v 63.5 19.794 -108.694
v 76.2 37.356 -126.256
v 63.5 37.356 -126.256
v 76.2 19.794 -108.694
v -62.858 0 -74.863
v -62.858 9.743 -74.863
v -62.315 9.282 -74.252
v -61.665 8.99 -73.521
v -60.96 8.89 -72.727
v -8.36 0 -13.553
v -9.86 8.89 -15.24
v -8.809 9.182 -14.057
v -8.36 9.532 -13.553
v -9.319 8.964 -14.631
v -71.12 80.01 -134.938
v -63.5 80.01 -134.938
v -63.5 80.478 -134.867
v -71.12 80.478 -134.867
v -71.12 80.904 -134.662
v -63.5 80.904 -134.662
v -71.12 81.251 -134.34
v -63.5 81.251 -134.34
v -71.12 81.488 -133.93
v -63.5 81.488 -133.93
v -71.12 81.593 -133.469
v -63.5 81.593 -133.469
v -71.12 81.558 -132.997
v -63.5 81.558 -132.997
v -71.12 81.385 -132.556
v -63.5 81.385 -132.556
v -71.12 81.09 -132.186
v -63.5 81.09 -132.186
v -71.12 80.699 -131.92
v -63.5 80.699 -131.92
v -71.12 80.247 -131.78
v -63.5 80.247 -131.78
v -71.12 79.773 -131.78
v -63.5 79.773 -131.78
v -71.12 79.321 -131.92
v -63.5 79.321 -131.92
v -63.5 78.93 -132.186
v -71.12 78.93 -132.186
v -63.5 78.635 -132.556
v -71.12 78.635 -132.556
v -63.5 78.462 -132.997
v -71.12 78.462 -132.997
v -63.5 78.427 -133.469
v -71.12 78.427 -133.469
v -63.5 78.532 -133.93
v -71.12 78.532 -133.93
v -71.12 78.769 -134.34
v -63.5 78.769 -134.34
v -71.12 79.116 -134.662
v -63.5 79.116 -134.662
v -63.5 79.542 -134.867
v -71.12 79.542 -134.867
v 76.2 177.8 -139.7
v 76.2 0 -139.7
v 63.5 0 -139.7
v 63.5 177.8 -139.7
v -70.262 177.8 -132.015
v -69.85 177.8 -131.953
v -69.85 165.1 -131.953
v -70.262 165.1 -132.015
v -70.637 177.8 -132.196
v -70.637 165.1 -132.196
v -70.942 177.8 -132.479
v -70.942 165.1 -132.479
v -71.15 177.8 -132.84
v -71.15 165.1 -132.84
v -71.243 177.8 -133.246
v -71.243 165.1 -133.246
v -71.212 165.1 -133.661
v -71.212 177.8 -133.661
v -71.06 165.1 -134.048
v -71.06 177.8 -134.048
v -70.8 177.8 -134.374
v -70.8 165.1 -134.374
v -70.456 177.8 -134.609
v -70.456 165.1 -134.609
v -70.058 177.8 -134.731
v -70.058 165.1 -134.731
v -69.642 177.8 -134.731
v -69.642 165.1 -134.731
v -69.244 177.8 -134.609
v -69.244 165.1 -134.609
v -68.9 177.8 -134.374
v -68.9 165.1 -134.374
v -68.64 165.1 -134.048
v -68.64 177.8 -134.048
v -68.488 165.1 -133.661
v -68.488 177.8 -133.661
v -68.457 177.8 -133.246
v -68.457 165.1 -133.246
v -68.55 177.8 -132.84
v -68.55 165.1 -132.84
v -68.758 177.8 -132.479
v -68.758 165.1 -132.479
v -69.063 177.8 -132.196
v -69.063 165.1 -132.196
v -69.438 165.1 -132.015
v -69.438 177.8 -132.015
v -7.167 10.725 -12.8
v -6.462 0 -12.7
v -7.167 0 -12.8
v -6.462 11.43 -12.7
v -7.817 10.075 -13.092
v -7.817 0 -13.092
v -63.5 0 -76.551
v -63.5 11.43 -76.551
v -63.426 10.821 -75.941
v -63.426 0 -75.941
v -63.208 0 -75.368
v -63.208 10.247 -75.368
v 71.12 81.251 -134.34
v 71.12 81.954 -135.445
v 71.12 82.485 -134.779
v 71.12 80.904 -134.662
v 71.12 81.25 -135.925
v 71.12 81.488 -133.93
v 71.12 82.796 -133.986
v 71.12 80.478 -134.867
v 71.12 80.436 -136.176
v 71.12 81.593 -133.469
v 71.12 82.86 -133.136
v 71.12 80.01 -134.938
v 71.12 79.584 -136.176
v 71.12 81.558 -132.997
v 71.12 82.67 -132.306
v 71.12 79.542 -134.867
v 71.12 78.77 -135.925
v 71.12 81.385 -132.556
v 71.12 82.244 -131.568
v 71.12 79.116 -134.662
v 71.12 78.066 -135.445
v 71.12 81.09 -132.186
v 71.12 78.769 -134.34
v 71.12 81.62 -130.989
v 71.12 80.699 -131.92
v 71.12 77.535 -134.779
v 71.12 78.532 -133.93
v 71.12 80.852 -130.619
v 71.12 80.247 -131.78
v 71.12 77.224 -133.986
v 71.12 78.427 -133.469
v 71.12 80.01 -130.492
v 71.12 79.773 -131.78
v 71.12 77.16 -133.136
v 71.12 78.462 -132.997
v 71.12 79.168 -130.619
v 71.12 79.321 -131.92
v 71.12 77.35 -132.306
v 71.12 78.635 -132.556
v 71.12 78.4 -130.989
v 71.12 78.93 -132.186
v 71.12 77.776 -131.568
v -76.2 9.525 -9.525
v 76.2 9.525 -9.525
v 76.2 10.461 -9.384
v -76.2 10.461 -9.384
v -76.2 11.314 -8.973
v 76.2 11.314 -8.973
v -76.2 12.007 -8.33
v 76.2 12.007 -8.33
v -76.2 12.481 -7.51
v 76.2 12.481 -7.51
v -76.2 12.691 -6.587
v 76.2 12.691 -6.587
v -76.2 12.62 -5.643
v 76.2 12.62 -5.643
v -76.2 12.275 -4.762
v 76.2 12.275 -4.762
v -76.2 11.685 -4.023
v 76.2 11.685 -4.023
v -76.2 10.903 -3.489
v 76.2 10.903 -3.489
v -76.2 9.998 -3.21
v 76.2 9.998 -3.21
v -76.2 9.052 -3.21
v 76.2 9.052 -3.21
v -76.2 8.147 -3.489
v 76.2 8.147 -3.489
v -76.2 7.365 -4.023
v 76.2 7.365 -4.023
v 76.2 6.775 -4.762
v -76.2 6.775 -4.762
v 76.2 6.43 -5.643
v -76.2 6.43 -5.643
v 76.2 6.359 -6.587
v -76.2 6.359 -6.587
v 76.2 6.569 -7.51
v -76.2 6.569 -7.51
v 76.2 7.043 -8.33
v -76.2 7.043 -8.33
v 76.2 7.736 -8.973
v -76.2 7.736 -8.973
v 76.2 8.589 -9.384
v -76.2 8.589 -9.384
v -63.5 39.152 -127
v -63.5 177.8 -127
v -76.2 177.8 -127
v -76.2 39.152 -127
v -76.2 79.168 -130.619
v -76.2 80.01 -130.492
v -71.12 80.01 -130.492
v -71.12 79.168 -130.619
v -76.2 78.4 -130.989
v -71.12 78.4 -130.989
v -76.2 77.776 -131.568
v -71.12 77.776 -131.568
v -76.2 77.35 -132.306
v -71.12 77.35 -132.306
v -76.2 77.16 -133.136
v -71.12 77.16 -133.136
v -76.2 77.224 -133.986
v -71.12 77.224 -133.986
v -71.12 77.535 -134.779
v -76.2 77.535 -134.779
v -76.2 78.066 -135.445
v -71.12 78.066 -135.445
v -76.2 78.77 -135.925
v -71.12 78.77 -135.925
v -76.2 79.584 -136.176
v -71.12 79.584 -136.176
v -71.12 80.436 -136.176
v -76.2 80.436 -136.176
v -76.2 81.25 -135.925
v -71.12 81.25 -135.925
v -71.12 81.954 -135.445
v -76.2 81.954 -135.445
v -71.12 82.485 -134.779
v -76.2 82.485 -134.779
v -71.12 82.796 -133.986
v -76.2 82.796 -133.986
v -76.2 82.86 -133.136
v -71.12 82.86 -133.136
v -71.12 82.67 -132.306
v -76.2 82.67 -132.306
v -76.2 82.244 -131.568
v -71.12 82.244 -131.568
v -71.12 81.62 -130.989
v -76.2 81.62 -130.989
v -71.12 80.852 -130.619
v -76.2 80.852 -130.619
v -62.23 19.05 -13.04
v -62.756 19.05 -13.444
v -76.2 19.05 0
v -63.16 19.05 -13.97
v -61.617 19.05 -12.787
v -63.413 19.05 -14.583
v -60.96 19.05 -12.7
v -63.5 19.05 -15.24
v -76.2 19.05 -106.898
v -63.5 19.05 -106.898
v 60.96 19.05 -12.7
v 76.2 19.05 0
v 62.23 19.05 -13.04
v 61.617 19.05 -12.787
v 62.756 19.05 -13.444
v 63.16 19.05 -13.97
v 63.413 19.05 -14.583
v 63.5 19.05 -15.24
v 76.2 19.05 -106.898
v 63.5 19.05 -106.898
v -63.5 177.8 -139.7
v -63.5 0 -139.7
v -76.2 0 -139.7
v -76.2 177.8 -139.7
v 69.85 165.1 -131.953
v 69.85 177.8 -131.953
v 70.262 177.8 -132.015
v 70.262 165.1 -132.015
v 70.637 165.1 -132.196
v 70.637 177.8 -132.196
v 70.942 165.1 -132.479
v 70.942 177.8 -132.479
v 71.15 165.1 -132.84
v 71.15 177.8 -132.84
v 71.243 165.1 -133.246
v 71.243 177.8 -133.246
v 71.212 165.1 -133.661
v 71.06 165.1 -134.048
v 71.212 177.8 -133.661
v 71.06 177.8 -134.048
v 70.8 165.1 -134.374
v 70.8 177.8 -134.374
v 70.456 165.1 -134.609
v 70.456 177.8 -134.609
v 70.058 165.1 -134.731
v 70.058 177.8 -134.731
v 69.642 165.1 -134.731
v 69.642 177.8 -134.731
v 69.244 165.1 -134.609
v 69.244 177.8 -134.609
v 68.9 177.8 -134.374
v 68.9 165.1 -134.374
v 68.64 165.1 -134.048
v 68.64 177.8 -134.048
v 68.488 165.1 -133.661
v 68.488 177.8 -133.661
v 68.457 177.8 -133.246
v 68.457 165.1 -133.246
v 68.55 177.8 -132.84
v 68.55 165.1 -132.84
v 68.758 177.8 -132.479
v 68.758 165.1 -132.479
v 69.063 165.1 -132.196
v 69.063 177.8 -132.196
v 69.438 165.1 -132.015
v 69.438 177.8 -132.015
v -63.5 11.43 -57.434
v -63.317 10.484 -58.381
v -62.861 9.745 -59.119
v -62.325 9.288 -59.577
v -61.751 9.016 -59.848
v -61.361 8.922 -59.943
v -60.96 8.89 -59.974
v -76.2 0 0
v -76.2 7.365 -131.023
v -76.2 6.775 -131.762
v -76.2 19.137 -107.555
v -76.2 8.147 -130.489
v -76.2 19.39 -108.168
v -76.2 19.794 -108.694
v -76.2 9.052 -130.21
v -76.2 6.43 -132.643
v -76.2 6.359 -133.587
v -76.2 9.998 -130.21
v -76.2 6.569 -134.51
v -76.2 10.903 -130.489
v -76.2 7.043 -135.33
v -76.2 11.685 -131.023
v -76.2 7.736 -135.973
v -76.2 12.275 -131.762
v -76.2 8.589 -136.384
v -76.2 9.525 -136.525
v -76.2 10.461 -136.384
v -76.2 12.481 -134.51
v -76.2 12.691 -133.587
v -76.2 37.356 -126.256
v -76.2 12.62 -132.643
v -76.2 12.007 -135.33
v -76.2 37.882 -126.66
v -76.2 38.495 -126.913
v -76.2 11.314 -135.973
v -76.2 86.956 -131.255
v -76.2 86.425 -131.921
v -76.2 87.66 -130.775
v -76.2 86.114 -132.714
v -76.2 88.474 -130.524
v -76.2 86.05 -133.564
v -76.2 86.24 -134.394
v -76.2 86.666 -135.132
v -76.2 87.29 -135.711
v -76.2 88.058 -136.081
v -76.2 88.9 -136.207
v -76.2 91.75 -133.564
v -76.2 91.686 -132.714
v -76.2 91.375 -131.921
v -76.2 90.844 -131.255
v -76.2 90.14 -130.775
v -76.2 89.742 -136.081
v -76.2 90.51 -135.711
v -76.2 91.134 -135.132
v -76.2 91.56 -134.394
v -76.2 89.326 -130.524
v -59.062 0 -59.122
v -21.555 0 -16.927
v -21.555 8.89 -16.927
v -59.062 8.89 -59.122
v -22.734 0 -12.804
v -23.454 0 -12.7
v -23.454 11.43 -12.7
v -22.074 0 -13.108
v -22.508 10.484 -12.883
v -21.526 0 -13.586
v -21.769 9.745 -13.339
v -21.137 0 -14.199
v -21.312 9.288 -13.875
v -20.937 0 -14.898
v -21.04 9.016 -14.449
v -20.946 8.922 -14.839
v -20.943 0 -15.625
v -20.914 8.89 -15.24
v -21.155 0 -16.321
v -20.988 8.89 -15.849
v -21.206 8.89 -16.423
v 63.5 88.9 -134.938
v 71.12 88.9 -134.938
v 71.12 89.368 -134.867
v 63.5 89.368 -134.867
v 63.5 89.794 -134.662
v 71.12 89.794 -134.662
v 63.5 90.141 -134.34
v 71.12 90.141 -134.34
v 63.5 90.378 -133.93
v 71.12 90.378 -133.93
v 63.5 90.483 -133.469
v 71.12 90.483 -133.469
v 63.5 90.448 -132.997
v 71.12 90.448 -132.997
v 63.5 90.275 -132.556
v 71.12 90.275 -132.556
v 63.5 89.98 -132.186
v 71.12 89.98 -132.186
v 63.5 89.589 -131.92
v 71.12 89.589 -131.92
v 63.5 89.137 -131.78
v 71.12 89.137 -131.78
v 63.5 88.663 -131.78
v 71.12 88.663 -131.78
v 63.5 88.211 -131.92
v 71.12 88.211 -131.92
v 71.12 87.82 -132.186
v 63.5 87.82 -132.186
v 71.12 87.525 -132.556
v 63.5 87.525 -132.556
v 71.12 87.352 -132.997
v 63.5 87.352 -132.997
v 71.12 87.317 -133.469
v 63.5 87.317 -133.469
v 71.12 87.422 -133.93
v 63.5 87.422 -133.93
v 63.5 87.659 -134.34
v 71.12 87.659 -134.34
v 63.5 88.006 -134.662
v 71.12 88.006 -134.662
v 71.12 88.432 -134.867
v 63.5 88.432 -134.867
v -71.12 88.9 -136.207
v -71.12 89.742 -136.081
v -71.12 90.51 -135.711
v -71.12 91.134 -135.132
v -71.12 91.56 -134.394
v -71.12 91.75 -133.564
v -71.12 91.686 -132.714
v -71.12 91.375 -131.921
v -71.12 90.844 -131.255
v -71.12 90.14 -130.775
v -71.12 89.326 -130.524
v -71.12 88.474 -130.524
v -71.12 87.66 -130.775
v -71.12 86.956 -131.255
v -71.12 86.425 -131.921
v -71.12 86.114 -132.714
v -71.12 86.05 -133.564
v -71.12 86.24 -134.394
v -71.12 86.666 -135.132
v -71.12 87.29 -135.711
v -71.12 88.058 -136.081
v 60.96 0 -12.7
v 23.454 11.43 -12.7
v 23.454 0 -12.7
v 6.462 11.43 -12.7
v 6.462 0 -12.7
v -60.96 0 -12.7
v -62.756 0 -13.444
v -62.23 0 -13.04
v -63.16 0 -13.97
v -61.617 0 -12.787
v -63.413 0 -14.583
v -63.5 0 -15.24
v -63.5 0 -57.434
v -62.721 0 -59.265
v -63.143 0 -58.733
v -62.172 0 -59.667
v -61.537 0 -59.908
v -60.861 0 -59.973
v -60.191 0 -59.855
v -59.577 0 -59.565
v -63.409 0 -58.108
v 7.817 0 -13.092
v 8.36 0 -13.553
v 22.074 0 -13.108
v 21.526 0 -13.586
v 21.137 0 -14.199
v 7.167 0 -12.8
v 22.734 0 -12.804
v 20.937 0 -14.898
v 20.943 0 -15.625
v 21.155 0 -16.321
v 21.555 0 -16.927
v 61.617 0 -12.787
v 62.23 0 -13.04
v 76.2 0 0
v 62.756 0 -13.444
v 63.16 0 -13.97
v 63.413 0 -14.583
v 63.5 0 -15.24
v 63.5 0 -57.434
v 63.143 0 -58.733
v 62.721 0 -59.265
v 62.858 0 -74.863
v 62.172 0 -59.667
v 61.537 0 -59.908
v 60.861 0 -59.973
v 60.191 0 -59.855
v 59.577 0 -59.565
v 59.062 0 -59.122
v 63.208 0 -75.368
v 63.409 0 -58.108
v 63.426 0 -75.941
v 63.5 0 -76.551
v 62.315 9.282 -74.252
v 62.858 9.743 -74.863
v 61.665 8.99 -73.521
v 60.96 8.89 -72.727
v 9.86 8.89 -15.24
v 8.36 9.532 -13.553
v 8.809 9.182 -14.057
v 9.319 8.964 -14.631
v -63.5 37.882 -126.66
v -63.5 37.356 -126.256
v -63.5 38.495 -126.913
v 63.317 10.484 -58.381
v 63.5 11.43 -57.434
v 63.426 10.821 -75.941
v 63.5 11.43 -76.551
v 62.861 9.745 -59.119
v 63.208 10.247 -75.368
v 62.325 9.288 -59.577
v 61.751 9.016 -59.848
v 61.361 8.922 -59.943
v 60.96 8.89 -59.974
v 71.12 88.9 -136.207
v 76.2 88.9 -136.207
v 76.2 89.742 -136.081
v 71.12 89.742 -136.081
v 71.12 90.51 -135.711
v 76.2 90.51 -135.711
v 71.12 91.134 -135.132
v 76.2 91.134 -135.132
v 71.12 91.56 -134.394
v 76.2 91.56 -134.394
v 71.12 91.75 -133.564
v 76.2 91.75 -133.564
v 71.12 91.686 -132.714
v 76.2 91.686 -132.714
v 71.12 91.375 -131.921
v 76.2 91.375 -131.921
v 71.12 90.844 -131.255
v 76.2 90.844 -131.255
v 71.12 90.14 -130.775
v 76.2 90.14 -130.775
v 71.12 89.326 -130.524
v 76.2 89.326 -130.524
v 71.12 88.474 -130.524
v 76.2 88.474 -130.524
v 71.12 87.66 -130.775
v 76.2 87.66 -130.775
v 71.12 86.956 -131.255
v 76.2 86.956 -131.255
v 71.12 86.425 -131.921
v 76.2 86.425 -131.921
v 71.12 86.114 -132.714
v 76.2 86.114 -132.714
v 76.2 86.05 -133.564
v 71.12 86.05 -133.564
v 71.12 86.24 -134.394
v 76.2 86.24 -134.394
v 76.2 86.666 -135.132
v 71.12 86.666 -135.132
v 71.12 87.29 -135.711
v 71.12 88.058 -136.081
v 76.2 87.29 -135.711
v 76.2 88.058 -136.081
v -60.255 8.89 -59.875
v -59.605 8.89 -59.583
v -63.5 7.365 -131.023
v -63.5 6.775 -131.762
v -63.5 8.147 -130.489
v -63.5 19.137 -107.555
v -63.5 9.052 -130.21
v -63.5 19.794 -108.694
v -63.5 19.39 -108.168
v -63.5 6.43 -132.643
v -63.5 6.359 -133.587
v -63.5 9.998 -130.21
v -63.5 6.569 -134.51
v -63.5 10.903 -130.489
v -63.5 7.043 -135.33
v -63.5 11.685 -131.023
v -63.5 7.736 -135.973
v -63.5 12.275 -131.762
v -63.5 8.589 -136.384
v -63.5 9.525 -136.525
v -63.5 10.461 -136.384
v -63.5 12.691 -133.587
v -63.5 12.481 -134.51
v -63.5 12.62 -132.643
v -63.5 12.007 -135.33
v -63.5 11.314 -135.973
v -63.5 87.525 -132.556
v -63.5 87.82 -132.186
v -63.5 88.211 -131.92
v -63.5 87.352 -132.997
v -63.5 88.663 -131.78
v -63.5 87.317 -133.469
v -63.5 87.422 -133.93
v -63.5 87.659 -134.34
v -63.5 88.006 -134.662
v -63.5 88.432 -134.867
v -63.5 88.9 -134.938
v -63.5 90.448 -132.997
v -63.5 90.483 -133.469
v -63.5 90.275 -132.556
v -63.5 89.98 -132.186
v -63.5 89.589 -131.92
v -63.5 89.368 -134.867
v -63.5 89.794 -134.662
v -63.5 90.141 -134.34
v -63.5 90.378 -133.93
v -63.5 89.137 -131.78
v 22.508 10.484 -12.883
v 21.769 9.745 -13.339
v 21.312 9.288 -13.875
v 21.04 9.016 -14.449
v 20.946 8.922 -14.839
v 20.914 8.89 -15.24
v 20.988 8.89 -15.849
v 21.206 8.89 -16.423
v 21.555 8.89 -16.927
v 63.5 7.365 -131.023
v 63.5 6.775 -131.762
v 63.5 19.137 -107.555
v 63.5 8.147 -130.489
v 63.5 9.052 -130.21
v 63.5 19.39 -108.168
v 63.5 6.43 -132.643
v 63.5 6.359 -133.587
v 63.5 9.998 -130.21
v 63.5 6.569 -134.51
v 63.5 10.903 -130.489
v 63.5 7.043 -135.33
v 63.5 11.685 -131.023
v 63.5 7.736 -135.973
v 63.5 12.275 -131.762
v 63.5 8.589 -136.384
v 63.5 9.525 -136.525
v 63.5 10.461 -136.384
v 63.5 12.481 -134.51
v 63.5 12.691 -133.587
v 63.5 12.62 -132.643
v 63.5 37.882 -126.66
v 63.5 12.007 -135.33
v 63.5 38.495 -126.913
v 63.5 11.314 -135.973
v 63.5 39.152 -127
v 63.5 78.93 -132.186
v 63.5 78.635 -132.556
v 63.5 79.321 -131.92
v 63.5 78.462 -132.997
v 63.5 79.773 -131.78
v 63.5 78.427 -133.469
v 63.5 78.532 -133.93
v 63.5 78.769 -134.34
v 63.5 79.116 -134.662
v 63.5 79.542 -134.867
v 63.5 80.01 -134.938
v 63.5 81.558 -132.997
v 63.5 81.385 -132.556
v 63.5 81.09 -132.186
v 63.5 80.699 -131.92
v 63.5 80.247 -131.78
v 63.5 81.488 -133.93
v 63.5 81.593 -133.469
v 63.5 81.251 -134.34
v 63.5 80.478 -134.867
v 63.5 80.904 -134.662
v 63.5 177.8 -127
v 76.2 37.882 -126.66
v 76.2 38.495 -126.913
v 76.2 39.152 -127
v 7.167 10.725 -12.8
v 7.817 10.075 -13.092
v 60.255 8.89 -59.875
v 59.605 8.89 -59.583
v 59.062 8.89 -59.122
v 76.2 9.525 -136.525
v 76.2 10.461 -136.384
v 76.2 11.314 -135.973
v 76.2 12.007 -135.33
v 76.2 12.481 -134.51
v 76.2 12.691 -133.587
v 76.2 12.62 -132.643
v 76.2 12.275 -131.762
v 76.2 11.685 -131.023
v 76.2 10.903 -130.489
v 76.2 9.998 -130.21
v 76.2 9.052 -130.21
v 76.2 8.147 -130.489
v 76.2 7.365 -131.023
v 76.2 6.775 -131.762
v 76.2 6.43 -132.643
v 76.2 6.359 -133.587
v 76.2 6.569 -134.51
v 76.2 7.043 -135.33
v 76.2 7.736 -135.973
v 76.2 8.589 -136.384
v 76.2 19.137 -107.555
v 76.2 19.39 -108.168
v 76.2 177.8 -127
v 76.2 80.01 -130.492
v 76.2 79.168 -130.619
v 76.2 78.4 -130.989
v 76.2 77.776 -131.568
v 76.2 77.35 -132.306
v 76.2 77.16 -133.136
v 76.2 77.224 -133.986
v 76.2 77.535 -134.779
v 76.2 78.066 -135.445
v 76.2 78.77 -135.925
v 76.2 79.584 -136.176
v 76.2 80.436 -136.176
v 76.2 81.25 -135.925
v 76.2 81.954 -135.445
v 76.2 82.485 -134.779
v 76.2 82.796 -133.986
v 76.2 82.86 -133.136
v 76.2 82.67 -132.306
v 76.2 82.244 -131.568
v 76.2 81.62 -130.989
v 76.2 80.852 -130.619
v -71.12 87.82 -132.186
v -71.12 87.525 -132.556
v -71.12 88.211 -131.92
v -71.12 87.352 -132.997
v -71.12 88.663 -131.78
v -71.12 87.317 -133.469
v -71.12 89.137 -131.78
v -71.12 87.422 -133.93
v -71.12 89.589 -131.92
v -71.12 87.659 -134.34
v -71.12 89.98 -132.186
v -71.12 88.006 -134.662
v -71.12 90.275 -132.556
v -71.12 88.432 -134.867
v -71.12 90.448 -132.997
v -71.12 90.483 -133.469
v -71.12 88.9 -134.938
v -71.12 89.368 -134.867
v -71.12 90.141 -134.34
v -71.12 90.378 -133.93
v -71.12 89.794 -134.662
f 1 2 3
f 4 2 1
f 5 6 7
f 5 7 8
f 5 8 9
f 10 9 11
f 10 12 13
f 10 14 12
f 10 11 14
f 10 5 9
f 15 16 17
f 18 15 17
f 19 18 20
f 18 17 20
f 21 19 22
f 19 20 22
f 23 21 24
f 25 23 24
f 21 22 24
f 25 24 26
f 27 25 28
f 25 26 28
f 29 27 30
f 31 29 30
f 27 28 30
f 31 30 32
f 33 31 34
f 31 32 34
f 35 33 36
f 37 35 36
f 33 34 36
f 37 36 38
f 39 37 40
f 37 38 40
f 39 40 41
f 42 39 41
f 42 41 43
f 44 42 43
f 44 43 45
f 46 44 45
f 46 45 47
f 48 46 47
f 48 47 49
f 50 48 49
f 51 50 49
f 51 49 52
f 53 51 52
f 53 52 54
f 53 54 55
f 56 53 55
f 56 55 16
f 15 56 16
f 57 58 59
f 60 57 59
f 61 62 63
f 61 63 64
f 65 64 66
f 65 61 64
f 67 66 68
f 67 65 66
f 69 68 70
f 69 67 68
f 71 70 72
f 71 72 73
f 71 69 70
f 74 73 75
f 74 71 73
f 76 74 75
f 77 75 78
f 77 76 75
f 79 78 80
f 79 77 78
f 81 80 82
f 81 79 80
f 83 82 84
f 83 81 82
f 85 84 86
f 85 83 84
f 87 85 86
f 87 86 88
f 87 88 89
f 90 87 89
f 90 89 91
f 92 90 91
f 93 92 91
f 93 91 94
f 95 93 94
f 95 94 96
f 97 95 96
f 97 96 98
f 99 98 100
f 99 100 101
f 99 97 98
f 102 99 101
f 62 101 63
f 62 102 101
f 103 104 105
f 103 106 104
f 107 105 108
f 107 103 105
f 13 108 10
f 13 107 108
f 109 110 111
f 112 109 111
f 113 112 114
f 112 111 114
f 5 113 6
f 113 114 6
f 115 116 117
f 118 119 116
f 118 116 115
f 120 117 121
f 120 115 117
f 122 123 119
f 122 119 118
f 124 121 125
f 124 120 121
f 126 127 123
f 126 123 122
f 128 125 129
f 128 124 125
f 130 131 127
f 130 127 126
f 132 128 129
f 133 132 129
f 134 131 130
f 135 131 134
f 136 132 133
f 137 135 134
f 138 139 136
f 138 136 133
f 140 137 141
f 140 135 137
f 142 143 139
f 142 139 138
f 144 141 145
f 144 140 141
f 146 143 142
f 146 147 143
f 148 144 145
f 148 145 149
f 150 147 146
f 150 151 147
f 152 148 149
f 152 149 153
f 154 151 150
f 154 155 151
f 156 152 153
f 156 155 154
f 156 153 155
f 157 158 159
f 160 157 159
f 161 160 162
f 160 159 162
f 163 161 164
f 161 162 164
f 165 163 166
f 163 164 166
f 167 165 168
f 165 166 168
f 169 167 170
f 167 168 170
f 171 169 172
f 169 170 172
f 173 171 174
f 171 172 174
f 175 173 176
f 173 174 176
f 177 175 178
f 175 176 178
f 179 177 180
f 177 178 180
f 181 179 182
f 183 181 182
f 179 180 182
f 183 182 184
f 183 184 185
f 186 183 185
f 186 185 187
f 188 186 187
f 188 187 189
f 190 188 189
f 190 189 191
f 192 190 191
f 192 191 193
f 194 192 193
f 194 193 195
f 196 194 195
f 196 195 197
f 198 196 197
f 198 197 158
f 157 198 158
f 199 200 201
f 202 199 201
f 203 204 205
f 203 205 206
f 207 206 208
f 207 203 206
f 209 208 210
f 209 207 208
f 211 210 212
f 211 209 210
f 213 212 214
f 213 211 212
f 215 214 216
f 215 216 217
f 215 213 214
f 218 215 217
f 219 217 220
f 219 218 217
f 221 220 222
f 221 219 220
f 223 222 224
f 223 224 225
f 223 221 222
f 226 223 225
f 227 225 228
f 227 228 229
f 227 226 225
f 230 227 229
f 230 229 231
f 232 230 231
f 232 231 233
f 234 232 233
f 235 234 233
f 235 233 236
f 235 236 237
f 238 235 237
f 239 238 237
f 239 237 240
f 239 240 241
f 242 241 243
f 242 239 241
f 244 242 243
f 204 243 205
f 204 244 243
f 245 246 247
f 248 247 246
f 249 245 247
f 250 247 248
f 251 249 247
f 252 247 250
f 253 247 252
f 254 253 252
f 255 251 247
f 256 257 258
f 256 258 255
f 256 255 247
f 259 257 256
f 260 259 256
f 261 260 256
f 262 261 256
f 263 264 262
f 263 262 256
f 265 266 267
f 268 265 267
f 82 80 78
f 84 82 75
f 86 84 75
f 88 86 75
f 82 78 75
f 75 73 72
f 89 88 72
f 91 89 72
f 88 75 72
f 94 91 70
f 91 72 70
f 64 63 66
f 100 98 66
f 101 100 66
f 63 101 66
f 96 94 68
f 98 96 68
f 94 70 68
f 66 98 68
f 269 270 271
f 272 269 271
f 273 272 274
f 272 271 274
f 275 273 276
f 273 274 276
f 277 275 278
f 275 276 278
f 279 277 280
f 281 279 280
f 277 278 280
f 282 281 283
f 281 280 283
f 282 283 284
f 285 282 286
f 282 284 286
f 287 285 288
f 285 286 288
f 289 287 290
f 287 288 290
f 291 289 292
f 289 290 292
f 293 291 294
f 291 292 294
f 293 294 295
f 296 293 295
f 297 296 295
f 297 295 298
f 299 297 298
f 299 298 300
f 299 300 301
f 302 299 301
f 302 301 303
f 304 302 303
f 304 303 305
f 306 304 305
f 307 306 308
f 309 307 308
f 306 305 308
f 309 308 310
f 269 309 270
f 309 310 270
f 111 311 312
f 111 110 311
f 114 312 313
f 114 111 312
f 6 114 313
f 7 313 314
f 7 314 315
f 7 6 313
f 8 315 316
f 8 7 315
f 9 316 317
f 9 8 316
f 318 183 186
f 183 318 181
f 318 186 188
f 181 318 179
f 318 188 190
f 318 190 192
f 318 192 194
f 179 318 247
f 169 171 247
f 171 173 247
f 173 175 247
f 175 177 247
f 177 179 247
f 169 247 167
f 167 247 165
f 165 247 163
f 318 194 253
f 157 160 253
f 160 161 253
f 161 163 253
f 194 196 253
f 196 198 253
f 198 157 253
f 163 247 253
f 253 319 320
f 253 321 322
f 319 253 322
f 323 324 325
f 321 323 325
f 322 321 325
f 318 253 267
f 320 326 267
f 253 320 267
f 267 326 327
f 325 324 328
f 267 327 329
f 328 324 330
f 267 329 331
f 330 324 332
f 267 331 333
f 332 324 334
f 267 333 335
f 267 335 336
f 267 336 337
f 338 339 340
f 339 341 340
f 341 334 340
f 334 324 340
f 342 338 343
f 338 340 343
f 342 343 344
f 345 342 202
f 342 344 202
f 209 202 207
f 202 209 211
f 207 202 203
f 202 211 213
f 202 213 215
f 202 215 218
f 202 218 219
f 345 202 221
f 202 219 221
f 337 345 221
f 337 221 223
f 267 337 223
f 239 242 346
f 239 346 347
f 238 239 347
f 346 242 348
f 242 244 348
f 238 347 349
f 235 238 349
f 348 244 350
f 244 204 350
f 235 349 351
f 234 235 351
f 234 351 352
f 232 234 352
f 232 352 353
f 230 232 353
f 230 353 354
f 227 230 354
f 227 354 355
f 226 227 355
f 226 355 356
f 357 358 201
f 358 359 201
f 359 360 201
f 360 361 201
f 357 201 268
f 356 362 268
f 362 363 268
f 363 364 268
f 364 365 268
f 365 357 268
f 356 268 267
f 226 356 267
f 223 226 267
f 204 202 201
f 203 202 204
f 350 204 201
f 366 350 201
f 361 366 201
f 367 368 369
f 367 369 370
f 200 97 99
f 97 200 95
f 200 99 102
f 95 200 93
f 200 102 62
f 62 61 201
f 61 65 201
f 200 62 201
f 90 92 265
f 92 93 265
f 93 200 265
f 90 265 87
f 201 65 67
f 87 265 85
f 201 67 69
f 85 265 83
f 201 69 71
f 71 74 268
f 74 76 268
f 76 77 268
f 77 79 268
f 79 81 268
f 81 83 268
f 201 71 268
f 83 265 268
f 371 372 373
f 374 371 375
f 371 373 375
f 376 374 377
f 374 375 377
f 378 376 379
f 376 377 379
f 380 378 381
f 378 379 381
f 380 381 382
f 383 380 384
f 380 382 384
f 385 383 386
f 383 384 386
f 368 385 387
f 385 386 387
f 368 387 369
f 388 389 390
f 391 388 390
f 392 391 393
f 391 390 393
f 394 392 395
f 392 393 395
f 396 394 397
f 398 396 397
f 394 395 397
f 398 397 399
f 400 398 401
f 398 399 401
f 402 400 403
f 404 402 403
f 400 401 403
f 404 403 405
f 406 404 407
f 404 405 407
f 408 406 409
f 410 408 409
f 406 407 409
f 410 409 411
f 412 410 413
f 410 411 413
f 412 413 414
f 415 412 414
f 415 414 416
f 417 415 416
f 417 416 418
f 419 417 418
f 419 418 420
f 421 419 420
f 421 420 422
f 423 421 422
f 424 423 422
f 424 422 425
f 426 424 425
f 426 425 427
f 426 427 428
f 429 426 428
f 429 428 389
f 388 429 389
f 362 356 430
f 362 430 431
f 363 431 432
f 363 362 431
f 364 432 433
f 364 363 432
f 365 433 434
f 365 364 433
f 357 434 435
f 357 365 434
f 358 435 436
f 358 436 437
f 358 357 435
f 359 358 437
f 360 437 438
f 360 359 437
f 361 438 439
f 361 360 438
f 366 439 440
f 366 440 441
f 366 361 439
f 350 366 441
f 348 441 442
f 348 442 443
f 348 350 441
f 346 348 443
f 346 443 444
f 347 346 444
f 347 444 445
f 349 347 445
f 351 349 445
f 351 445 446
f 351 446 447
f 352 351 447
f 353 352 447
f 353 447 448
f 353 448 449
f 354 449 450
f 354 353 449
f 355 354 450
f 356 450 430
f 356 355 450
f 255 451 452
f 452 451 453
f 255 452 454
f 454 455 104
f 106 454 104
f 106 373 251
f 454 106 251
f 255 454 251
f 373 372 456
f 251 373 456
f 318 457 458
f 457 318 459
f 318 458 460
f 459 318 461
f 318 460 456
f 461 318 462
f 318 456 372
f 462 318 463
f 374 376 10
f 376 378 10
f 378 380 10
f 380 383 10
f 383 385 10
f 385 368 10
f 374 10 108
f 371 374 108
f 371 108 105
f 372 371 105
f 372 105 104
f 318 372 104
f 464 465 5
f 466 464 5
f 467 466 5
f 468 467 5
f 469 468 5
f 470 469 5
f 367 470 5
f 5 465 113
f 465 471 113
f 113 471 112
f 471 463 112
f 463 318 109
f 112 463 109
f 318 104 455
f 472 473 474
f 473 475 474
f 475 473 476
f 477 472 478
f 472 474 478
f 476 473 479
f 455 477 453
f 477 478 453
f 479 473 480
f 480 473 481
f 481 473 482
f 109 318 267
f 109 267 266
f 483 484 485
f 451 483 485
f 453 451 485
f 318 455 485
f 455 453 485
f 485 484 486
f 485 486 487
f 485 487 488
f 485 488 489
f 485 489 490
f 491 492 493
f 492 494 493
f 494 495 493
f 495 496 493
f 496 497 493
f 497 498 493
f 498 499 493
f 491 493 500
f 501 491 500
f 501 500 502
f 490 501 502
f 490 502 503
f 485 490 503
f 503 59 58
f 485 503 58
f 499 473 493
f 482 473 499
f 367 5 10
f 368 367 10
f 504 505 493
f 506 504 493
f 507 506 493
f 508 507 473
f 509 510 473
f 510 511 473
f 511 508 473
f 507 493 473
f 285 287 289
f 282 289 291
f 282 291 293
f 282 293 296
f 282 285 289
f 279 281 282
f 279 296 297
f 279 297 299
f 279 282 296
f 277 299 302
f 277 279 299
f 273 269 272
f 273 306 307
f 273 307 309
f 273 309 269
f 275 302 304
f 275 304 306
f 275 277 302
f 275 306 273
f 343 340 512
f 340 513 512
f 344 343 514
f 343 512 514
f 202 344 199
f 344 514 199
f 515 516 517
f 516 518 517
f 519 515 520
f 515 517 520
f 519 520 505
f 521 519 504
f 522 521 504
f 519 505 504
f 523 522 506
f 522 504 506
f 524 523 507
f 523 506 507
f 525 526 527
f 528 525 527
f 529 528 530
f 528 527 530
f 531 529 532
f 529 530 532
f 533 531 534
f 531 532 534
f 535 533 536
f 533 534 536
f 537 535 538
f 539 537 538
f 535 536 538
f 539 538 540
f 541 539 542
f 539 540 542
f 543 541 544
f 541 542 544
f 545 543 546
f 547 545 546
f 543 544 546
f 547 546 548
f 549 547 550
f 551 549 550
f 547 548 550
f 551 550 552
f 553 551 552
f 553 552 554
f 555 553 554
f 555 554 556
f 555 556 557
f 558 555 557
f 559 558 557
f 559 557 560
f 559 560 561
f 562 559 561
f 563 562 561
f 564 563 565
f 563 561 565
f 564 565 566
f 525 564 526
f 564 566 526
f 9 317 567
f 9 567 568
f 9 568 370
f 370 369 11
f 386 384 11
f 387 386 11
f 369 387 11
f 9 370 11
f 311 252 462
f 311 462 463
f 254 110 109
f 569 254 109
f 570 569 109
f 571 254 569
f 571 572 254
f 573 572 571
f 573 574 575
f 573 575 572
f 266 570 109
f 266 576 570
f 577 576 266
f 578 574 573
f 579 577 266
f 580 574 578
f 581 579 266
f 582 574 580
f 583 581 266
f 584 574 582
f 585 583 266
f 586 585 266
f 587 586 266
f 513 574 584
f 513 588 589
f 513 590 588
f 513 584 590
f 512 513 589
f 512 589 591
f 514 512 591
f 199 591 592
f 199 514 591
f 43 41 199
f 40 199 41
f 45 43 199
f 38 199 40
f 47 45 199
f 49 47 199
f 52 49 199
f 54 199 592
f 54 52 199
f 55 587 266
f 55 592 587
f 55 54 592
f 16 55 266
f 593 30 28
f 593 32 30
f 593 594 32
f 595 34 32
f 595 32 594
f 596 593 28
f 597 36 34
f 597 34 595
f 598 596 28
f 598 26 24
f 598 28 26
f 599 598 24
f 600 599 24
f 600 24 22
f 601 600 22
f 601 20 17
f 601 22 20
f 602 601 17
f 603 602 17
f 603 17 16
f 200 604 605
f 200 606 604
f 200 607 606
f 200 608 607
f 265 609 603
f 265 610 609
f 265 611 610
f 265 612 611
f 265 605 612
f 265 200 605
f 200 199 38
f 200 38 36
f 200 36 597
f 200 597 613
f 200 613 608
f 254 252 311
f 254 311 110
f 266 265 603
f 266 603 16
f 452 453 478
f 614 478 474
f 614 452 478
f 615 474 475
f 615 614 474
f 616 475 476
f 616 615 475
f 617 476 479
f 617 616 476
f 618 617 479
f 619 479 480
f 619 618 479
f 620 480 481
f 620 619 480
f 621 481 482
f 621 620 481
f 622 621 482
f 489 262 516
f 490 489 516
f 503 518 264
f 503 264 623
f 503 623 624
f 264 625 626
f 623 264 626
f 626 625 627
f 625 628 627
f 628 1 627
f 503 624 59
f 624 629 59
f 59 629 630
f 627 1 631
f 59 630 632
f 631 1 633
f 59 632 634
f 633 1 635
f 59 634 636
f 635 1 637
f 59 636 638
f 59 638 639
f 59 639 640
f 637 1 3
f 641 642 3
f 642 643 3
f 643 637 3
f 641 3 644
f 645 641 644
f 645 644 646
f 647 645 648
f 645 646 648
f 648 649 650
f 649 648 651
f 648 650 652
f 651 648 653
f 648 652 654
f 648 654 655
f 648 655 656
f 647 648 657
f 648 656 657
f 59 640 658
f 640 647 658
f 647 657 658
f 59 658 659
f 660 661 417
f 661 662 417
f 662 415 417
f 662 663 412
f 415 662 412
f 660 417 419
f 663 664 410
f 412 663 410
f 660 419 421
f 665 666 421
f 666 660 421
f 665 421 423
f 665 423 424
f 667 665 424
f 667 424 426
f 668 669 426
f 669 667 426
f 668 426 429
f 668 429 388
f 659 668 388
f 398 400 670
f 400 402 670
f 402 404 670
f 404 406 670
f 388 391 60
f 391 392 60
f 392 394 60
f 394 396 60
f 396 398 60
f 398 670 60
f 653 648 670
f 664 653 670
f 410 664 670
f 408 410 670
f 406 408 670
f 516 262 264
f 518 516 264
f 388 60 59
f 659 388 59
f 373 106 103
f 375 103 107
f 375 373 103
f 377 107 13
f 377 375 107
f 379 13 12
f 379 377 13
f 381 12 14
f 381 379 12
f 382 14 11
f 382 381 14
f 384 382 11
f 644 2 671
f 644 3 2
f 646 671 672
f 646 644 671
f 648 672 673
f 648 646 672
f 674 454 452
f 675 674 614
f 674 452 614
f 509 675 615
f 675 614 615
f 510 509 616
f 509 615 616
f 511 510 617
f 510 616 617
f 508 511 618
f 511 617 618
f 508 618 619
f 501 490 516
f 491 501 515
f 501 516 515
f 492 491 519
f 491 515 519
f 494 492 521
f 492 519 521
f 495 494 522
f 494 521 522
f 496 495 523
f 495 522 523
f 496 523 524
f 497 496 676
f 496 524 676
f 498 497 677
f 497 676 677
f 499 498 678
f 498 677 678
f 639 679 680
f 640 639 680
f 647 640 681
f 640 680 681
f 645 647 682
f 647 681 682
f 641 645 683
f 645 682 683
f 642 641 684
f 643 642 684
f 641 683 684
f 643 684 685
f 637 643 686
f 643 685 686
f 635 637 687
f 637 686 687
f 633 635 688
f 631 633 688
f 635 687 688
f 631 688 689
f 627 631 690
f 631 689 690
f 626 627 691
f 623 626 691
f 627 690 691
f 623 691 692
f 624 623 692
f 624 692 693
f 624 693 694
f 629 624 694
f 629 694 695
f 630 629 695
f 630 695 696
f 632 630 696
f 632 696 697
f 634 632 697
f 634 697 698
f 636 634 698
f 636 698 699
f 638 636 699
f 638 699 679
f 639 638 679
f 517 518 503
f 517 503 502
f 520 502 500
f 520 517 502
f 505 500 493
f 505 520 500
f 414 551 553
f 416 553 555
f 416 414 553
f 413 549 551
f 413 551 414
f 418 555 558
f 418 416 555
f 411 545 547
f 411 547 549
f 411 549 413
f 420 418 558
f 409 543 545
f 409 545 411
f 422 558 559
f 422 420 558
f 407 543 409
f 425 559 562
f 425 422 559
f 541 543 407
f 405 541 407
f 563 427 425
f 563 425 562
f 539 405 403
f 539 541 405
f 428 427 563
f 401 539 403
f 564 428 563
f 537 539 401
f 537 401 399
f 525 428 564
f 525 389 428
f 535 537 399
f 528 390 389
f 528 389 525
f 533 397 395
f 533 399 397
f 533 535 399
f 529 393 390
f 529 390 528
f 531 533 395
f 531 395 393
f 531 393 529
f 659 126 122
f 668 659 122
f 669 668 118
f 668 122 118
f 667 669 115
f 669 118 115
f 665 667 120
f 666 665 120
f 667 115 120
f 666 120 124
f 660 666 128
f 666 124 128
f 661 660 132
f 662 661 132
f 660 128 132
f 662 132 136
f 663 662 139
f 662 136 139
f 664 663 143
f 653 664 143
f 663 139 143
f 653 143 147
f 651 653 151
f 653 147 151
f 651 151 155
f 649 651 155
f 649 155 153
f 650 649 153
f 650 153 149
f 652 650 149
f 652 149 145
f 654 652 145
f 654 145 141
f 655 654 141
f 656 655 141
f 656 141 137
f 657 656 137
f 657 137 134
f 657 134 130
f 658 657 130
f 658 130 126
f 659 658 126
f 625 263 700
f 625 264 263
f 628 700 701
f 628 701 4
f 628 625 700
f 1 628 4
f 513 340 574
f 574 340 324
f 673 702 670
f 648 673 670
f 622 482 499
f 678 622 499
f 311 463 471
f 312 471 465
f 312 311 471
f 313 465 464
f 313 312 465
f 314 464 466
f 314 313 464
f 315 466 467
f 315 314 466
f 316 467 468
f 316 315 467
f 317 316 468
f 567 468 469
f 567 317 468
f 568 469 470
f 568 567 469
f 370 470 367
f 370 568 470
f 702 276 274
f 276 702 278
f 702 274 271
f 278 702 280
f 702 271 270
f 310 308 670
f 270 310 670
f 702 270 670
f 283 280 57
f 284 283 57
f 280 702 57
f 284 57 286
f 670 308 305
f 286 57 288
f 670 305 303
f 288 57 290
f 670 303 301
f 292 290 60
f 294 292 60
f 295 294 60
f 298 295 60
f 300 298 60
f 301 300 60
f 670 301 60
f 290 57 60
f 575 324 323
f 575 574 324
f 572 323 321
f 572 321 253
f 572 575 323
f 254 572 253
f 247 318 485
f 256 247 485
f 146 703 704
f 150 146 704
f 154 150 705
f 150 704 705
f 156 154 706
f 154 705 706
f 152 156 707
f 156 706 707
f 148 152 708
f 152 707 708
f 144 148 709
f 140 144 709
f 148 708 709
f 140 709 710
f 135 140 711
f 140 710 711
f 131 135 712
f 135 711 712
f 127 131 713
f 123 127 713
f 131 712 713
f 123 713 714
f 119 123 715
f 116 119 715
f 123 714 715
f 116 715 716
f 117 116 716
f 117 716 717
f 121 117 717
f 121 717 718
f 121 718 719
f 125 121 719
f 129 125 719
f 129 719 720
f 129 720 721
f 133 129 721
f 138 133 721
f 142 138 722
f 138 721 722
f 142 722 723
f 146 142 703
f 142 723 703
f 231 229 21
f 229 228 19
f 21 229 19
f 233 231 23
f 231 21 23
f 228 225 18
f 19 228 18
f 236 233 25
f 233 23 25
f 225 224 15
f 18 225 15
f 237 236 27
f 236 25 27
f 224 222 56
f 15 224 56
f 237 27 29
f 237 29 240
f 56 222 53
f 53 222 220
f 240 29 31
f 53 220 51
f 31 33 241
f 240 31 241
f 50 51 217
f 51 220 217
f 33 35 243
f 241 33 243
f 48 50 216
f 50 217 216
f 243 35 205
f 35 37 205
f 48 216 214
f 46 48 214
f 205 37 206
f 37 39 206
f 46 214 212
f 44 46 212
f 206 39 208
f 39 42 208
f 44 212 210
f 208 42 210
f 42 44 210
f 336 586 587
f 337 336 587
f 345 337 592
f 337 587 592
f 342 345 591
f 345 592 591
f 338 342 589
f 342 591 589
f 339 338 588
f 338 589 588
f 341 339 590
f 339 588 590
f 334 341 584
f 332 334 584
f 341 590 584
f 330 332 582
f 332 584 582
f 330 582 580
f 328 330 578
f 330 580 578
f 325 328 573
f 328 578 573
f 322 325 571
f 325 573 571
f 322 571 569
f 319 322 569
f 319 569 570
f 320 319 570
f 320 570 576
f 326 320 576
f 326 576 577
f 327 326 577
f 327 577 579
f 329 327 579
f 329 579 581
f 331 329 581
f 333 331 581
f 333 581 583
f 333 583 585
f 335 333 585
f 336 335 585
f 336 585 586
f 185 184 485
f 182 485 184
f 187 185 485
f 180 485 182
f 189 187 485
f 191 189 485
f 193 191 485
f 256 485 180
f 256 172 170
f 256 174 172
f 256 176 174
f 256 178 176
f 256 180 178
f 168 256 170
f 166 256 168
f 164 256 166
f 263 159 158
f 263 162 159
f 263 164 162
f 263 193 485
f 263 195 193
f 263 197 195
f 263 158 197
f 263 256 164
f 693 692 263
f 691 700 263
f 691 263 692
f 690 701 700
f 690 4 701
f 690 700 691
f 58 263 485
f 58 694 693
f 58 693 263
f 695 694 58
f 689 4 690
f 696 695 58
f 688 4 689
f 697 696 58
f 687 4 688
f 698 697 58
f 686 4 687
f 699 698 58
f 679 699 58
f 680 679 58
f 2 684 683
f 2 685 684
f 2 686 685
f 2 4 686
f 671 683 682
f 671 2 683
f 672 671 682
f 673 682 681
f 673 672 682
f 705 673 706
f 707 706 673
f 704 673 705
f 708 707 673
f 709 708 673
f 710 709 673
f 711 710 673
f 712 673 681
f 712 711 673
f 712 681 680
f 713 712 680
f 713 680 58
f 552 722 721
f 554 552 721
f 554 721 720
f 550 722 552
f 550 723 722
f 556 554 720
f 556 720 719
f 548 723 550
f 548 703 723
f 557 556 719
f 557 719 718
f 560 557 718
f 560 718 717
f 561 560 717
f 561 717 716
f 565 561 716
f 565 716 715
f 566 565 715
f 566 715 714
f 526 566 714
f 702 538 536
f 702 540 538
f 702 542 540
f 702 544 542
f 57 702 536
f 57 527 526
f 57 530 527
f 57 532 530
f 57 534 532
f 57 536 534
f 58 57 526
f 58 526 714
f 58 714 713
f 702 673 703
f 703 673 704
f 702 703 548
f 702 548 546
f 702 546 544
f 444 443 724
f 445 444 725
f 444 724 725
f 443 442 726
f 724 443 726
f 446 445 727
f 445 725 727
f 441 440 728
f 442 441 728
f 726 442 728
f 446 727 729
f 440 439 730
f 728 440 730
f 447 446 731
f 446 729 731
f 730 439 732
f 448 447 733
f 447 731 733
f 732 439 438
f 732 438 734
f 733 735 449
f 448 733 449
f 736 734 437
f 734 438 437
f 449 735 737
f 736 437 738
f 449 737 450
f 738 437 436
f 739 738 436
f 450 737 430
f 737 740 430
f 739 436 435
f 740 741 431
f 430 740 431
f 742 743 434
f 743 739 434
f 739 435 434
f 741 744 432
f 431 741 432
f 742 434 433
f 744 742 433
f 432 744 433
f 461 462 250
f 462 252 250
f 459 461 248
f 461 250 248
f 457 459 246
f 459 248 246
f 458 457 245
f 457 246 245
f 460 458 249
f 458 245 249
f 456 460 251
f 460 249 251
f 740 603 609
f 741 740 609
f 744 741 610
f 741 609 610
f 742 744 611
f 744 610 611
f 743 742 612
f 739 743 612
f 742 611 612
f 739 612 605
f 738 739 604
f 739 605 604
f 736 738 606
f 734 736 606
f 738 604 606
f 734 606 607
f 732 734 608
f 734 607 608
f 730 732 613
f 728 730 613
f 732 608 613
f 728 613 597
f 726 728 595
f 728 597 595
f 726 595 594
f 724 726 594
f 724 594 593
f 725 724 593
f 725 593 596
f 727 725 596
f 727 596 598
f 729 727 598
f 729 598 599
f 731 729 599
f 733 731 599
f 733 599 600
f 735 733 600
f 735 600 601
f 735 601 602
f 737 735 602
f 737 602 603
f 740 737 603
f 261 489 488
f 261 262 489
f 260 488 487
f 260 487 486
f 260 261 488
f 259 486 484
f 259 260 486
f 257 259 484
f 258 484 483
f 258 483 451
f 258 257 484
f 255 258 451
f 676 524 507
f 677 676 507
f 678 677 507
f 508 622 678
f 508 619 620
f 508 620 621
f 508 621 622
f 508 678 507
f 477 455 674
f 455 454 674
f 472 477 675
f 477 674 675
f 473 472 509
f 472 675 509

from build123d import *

# Parameters (mm, degrees)
BOSS_EXTRUDE1_DEPTH   = 19.05
SKETCH2_W             = 12.7
SKETCH2_H             = 158.75
BOSS_EXTRUDE2_DEPTH   = 12.7
BOSS_EXTRUDE2_2_DEPTH = 12.7
BOSS_EXTRUDE3_DEPTH   = 12.7
BOSS_EXTRUDE4_DEPTH   = 12.7
SKETCH5_R             = 1.5875
CUT_EXTRUDE1_DEPTH    = 273.680564031
SKETCH6_R             = 2.8575
CUT_EXTRUDE2_DEPTH    = 5.08
BOSS_EXTRUDE5_DEPTH   = 8.89
SKETCH8_R             = 1.397
CUT_EXTRUDE3_DEPTH    = 12.7
FILLET1_R             = 2.54
SKETCH9_R             = 3.175
CUT_EXTRUDE4_DEPTH    = 273.680564031


with BuildPart() as part:
    # Sketch1 → Boss-Extrude1 (new body)
    with BuildSketch(Plane(origin=(0, 0, 0), x_dir=(1, 0, 0), z_dir=(0, 1, 0))):
        Polygon((-76.2, 139.7), (-76.2, 0), (76.2, 0), (76.2, 139.7), (63.5, 139.7), (63.5, 12.7), (-63.5, 12.7), (-63.5, 139.7), align=None)
    extrude(amount=BOSS_EXTRUDE1_DEPTH)



with BuildPart() as body_2:
    # Sketch2 → Boss-Extrude2 (new body)
    with BuildSketch(Plane(origin=(0, 0, -139.7), x_dir=(-1, 0, 0), z_dir=(0, 0, -1))):
        with Locations((-69.85, 98.425)):
            Rectangle(SKETCH2_W, SKETCH2_H)
    extrude(amount=-BOSS_EXTRUDE2_DEPTH)


with BuildPart() as body_3:
    # Sketch2 → Boss-Extrude2 2 (new body)
    with BuildSketch(Plane(origin=(0, 0, -139.7), x_dir=(-1, 0, 0), z_dir=(0, 0, -1))):
        with Locations((69.85, 98.425)):
            Rectangle(SKETCH2_W, SKETCH2_H)
    extrude(amount=-BOSS_EXTRUDE2_2_DEPTH)


with BuildPart() as part_1:
    add(part.part)

    add(body_2.part)  # Boss-Extrude3 merges body 2
    # Sketch3 → Boss-Extrude3 (add)
    with BuildSketch(Plane(origin=(76.2, 0, 0), x_dir=(0, 0, -1), z_dir=(1, 0, 0))):
        Polygon((127, 38.1), (107.95, 19.05), (127, 19.05), align=None)
    extrude(amount=-BOSS_EXTRUDE3_DEPTH)


    add(body_3.part)  # Boss-Extrude4 merges body 3
    # Sketch4 → Boss-Extrude4 (add)
    with BuildSketch(Plane.ZY.offset(76.2)):
        Polygon((-127, 38.1), (-107.95, 19.05), (-127, 19.05), align=None)
    extrude(amount=-BOSS_EXTRUDE4_DEPTH)

    # Sketch5 → Cut-Extrude1 (cut, through all)
    with BuildSketch(Plane(origin=(76.2, 0, 0), x_dir=(0, 0, -1), z_dir=(1, 0, 0))):
        with Locations((133.35, 88.9)):
            Circle(SKETCH5_R)
        with Locations((133.35, 80.01)):
            Circle(SKETCH5_R)
    extrude(amount=-CUT_EXTRUDE1_DEPTH, mode=Mode.SUBTRACT)

    # Sketch6 → Cut-Extrude2 (cut)
    with BuildSketch(Plane(origin=(76.2, 0, 0), x_dir=(0, 0, -1), z_dir=(1, 0, 0))):
        with Locations((133.35, 88.9)):
            Circle(SKETCH6_R)
        with Locations(Location((133.35, 80.01, 0), (0, 0, 180))):
            Circle(SKETCH6_R)
    cut_extrude2 = extrude(amount=-CUT_EXTRUDE2_DEPTH, mode=Mode.SUBTRACT)

    # Mirror2: Cut-Extrude2 across plane
    add(cut_extrude2.mirror(Plane(origin=(0, 0, 0), x_dir=(0, 0, 1), z_dir=(1, 0, 0))), mode=Mode.SUBTRACT)

    # Sketch7 → Boss-Extrude5 (add)
    with BuildSketch(Plane.XZ):
        Polygon((-17.797608372, -12.7), (-63.5, -64.115190582), (-63.5, -75.584809418), (-7.602391628, -12.7), align=None)
        Polygon((7.602391628, -12.7), (17.797608372, -12.7), (63.5, -64.115190582), (63.5, -75.584809418), align=None)
    extrude(amount=-BOSS_EXTRUDE5_DEPTH)

    # Sketch8 → Cut-Extrude3 (cut)
    with BuildSketch(Plane(origin=(0, 177.8, 0), x_dir=(1, 0, 0), z_dir=(0, 1, 0))):
        with Locations(Location((69.85, 133.35, 0), (0, 0, 270))):
            Circle(SKETCH8_R)
    cut_extrude3 = extrude(amount=-CUT_EXTRUDE3_DEPTH, mode=Mode.SUBTRACT)

    # Mirror3: Cut-Extrude3 across plane
    add(cut_extrude3.mirror(Plane(origin=(0, 0, 0), x_dir=(0, 0, 1), z_dir=(1, 0, 0))), mode=Mode.SUBTRACT)

    # Fillet1
    fillet1_edges = [part_1.edges().sort_by_distance(p)[0] for p in [
        (63.5, 4.445, -75.584809418),
        (12.7, 8.89, -12.7),
        (7.602391628, 4.445, -12.7),
        (17.797608372, 4.445, -12.7),
        (63.5, 8.89, -69.85),
        (63.5, 4.445, -64.115190582),
        (-69.85, 19.05, -107.95),
        (-69.85, 38.1, -127),
        (63.5, 9.525, -12.7),
        (-63.5, 9.525, -12.7),
        (69.85, 19.05, -107.95),
        (69.85, 38.1, -127),
        (-12.7, 8.89, -12.7),
        (-17.797608372, 4.445, -12.7),
        (-7.602391628, 4.445, -12.7),
        (-63.5, 8.89, -69.85),
        (-63.5, 4.445, -75.584809418),
        (-63.5, 4.445, -64.115190582),
    ]]
    fillet(fillet1_edges, radius=FILLET1_R)

    # Sketch9 → Cut-Extrude4 (cut, through all)
    with BuildSketch(Plane(origin=(76.2, 0, 0), x_dir=(0, 0, -1), z_dir=(1, 0, 0))):
        with Locations((6.35, 9.525)):
            Circle(SKETCH9_R)
        with Locations((133.35, 9.525)):
            Circle(SKETCH9_R)
    extrude(amount=-CUT_EXTRUDE4_DEPTH, mode=Mode.SUBTRACT)


solid = part_1.part
